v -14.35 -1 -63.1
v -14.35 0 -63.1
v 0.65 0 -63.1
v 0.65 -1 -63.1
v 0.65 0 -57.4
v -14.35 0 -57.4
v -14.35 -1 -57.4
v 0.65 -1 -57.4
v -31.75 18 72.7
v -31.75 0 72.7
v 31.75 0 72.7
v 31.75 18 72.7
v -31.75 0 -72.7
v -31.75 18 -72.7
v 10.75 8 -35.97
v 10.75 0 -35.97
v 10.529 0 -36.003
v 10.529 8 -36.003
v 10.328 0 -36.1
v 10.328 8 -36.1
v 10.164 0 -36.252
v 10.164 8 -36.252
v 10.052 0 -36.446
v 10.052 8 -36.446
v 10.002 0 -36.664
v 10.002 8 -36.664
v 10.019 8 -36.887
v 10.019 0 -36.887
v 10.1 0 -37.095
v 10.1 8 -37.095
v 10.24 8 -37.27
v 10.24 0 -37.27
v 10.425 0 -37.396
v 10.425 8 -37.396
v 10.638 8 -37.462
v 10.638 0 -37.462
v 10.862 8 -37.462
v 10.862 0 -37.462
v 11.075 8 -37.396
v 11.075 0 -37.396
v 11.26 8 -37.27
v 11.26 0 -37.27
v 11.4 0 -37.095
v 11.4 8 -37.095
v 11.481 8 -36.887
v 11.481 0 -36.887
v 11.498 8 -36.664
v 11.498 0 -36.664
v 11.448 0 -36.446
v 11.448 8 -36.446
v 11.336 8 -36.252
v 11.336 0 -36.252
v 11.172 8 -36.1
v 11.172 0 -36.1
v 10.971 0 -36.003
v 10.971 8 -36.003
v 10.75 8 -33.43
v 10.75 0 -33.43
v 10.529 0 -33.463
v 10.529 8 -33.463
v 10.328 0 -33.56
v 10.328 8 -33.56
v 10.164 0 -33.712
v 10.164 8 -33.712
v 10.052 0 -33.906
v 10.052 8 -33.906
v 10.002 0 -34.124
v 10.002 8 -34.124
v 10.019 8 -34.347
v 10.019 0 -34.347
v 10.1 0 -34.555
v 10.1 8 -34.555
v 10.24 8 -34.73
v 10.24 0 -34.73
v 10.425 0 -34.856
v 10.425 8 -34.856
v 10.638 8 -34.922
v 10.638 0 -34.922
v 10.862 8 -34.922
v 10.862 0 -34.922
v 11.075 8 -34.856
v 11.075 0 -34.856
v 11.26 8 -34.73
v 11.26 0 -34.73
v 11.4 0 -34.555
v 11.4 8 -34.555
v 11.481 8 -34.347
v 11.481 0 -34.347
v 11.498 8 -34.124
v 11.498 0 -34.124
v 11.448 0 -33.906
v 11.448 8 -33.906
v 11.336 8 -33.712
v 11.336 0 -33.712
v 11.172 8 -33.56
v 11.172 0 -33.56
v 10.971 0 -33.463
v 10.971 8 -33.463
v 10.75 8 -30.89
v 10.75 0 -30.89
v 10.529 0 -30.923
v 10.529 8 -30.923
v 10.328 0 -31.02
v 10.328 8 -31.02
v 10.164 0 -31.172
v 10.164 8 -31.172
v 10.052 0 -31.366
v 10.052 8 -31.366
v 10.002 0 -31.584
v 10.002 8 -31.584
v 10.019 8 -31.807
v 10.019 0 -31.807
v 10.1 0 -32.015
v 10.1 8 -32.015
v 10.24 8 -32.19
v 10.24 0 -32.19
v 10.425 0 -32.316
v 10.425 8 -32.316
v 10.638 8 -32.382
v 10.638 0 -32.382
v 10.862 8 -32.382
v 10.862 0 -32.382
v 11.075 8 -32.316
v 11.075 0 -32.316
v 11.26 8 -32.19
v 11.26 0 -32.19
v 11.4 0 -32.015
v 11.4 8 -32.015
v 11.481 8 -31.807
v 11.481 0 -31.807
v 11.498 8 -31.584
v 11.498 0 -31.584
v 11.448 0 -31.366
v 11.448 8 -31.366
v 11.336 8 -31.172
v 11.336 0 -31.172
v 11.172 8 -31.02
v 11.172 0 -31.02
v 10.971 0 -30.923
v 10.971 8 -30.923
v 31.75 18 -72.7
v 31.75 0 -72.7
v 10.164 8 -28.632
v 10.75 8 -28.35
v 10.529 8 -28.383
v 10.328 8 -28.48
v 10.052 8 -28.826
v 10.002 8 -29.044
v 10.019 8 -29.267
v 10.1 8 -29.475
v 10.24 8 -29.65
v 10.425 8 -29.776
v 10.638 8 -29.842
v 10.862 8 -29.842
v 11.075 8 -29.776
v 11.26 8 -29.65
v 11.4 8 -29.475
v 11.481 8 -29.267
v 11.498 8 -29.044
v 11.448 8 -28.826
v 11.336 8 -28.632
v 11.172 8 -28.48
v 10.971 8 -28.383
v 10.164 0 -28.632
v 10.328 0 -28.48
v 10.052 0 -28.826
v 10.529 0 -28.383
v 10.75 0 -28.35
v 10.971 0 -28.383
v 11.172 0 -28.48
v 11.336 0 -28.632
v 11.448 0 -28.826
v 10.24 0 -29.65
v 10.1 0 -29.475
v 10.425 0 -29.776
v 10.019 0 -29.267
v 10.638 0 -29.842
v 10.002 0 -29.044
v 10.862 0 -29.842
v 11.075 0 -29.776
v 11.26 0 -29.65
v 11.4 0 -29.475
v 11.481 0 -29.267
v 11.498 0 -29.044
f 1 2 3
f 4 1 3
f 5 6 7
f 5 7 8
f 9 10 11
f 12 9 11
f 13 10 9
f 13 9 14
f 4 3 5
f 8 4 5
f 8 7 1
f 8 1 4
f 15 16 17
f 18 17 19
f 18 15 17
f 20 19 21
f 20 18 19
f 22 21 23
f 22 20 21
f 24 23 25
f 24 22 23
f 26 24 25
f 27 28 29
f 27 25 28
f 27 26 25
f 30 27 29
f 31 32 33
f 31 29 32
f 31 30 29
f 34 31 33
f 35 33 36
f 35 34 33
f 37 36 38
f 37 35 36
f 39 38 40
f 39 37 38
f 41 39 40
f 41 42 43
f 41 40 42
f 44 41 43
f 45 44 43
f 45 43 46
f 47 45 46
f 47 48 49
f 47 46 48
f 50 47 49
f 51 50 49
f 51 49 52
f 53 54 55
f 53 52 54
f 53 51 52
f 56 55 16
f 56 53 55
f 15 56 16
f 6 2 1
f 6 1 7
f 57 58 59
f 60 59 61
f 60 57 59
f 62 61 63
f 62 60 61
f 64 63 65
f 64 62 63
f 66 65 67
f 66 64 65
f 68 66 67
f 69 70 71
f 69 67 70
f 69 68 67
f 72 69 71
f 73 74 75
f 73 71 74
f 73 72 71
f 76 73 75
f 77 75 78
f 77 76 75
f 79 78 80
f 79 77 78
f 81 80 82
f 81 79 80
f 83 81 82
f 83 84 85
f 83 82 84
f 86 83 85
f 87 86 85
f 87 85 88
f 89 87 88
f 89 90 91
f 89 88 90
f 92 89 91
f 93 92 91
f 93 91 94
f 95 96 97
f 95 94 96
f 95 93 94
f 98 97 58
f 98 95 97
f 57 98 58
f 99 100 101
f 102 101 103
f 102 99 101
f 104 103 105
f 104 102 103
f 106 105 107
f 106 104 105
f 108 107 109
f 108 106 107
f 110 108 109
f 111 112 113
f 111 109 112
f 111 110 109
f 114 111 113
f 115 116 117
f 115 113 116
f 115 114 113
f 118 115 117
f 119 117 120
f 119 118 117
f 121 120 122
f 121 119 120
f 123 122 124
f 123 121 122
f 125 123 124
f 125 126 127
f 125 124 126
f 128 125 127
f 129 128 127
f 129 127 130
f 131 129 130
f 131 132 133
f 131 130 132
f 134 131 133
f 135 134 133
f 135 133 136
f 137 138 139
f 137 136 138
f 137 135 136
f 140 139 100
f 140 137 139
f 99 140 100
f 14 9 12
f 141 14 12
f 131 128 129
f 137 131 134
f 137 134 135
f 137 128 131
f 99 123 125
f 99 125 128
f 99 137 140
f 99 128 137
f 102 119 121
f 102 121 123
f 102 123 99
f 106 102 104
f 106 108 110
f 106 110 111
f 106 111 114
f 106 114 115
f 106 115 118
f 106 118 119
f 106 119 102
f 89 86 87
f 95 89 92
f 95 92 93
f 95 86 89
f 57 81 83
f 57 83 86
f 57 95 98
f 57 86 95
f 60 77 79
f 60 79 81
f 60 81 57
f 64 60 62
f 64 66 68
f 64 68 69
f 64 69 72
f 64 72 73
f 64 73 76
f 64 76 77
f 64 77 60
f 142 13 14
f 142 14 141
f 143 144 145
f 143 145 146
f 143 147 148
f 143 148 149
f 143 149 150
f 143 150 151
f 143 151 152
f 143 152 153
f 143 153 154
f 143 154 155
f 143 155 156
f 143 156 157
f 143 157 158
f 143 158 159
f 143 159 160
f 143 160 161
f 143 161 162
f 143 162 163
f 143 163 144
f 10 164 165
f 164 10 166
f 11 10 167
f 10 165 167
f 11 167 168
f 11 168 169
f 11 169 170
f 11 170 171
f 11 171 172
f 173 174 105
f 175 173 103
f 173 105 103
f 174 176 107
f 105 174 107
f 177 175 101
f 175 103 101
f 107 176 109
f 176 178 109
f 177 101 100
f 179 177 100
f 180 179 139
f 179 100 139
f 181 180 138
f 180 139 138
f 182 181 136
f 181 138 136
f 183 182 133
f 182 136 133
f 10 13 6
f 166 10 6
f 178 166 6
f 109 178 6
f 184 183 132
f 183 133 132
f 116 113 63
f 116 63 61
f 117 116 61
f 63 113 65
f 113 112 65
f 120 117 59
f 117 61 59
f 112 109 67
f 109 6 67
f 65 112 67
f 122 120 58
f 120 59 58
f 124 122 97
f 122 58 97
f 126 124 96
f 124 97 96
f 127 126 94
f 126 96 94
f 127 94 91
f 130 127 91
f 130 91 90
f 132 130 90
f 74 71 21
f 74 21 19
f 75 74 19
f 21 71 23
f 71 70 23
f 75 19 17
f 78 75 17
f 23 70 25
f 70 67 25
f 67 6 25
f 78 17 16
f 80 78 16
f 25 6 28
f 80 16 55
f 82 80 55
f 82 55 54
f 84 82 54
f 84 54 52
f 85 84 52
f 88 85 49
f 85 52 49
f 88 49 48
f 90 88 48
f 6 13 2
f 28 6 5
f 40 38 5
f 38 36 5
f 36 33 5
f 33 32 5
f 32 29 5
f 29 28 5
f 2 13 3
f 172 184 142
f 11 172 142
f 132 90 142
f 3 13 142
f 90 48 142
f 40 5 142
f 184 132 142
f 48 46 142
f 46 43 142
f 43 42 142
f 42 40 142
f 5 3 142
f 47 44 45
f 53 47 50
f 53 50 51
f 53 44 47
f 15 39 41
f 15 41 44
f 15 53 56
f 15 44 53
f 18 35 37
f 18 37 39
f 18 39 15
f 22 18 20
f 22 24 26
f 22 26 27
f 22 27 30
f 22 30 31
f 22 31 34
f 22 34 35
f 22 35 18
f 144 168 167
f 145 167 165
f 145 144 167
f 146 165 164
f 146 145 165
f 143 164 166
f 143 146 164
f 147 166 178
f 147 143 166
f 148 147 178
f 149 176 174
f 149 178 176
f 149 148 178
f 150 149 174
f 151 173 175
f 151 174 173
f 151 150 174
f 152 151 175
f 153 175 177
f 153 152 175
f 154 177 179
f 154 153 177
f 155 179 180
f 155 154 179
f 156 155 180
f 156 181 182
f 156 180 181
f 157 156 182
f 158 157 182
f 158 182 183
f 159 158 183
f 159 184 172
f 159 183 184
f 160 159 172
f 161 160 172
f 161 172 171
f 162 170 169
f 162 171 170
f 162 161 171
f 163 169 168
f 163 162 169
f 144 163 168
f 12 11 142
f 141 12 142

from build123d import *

# Parameters (mm, degrees)
SKETCH1_W               = 63.5
SKETCH1_H               = 145.4
BOSS_EXTRUDE1_DEPTH     = 18
CUT_EXTRUDE2_DEPTH      = 82.347111196
CUT_EXTRUDE2_DEPTH_BACK = 8
SKETCH3_R               = 0.75
SKETCH4_W               = 15
SKETCH4_H               = 5.7
BOSS_EXTRUDE2_DEPTH     = 1


with BuildPart() as part:
    # Sketch1 → Boss-Extrude1 (new body)
    with BuildSketch(Plane(origin=(0, 0, 0), x_dir=(1, 0, 0), z_dir=(0, 1, 0))):
        Rectangle(SKETCH1_W, SKETCH1_H)
    extrude(amount=BOSS_EXTRUDE1_DEPTH)

    # Sketch3 → Cut-Extrude2 (cut, two sides: drawn at the far end of the back side and taken through both)
    with BuildSketch(Plane.XZ.offset(-CUT_EXTRUDE2_DEPTH_BACK)):
        with Locations(Location((10.75, -29.1, 0), (0, 0, 90))):
            Circle(SKETCH3_R)
        with Locations(Location((10.75, -31.64, 0), (0, 0, 90))):
            Circle(SKETCH3_R)
        with Locations(Location((10.75, -34.18, 0), (0, 0, 90))):
            Circle(SKETCH3_R)
        with Locations(Location((10.75, -36.72, 0), (0, 0, 90))):
            Circle(SKETCH3_R)
    extrude(amount=CUT_EXTRUDE2_DEPTH + CUT_EXTRUDE2_DEPTH_BACK, mode=Mode.SUBTRACT)

    # Sketch4 → Boss-Extrude2 (add)
    with BuildSketch(Plane.XZ):
        with Locations((-6.85, -60.25)):
            Rectangle(SKETCH4_W, SKETCH4_H)
    extrude(amount=BOSS_EXTRUDE2_DEPTH)


solid = part.part
